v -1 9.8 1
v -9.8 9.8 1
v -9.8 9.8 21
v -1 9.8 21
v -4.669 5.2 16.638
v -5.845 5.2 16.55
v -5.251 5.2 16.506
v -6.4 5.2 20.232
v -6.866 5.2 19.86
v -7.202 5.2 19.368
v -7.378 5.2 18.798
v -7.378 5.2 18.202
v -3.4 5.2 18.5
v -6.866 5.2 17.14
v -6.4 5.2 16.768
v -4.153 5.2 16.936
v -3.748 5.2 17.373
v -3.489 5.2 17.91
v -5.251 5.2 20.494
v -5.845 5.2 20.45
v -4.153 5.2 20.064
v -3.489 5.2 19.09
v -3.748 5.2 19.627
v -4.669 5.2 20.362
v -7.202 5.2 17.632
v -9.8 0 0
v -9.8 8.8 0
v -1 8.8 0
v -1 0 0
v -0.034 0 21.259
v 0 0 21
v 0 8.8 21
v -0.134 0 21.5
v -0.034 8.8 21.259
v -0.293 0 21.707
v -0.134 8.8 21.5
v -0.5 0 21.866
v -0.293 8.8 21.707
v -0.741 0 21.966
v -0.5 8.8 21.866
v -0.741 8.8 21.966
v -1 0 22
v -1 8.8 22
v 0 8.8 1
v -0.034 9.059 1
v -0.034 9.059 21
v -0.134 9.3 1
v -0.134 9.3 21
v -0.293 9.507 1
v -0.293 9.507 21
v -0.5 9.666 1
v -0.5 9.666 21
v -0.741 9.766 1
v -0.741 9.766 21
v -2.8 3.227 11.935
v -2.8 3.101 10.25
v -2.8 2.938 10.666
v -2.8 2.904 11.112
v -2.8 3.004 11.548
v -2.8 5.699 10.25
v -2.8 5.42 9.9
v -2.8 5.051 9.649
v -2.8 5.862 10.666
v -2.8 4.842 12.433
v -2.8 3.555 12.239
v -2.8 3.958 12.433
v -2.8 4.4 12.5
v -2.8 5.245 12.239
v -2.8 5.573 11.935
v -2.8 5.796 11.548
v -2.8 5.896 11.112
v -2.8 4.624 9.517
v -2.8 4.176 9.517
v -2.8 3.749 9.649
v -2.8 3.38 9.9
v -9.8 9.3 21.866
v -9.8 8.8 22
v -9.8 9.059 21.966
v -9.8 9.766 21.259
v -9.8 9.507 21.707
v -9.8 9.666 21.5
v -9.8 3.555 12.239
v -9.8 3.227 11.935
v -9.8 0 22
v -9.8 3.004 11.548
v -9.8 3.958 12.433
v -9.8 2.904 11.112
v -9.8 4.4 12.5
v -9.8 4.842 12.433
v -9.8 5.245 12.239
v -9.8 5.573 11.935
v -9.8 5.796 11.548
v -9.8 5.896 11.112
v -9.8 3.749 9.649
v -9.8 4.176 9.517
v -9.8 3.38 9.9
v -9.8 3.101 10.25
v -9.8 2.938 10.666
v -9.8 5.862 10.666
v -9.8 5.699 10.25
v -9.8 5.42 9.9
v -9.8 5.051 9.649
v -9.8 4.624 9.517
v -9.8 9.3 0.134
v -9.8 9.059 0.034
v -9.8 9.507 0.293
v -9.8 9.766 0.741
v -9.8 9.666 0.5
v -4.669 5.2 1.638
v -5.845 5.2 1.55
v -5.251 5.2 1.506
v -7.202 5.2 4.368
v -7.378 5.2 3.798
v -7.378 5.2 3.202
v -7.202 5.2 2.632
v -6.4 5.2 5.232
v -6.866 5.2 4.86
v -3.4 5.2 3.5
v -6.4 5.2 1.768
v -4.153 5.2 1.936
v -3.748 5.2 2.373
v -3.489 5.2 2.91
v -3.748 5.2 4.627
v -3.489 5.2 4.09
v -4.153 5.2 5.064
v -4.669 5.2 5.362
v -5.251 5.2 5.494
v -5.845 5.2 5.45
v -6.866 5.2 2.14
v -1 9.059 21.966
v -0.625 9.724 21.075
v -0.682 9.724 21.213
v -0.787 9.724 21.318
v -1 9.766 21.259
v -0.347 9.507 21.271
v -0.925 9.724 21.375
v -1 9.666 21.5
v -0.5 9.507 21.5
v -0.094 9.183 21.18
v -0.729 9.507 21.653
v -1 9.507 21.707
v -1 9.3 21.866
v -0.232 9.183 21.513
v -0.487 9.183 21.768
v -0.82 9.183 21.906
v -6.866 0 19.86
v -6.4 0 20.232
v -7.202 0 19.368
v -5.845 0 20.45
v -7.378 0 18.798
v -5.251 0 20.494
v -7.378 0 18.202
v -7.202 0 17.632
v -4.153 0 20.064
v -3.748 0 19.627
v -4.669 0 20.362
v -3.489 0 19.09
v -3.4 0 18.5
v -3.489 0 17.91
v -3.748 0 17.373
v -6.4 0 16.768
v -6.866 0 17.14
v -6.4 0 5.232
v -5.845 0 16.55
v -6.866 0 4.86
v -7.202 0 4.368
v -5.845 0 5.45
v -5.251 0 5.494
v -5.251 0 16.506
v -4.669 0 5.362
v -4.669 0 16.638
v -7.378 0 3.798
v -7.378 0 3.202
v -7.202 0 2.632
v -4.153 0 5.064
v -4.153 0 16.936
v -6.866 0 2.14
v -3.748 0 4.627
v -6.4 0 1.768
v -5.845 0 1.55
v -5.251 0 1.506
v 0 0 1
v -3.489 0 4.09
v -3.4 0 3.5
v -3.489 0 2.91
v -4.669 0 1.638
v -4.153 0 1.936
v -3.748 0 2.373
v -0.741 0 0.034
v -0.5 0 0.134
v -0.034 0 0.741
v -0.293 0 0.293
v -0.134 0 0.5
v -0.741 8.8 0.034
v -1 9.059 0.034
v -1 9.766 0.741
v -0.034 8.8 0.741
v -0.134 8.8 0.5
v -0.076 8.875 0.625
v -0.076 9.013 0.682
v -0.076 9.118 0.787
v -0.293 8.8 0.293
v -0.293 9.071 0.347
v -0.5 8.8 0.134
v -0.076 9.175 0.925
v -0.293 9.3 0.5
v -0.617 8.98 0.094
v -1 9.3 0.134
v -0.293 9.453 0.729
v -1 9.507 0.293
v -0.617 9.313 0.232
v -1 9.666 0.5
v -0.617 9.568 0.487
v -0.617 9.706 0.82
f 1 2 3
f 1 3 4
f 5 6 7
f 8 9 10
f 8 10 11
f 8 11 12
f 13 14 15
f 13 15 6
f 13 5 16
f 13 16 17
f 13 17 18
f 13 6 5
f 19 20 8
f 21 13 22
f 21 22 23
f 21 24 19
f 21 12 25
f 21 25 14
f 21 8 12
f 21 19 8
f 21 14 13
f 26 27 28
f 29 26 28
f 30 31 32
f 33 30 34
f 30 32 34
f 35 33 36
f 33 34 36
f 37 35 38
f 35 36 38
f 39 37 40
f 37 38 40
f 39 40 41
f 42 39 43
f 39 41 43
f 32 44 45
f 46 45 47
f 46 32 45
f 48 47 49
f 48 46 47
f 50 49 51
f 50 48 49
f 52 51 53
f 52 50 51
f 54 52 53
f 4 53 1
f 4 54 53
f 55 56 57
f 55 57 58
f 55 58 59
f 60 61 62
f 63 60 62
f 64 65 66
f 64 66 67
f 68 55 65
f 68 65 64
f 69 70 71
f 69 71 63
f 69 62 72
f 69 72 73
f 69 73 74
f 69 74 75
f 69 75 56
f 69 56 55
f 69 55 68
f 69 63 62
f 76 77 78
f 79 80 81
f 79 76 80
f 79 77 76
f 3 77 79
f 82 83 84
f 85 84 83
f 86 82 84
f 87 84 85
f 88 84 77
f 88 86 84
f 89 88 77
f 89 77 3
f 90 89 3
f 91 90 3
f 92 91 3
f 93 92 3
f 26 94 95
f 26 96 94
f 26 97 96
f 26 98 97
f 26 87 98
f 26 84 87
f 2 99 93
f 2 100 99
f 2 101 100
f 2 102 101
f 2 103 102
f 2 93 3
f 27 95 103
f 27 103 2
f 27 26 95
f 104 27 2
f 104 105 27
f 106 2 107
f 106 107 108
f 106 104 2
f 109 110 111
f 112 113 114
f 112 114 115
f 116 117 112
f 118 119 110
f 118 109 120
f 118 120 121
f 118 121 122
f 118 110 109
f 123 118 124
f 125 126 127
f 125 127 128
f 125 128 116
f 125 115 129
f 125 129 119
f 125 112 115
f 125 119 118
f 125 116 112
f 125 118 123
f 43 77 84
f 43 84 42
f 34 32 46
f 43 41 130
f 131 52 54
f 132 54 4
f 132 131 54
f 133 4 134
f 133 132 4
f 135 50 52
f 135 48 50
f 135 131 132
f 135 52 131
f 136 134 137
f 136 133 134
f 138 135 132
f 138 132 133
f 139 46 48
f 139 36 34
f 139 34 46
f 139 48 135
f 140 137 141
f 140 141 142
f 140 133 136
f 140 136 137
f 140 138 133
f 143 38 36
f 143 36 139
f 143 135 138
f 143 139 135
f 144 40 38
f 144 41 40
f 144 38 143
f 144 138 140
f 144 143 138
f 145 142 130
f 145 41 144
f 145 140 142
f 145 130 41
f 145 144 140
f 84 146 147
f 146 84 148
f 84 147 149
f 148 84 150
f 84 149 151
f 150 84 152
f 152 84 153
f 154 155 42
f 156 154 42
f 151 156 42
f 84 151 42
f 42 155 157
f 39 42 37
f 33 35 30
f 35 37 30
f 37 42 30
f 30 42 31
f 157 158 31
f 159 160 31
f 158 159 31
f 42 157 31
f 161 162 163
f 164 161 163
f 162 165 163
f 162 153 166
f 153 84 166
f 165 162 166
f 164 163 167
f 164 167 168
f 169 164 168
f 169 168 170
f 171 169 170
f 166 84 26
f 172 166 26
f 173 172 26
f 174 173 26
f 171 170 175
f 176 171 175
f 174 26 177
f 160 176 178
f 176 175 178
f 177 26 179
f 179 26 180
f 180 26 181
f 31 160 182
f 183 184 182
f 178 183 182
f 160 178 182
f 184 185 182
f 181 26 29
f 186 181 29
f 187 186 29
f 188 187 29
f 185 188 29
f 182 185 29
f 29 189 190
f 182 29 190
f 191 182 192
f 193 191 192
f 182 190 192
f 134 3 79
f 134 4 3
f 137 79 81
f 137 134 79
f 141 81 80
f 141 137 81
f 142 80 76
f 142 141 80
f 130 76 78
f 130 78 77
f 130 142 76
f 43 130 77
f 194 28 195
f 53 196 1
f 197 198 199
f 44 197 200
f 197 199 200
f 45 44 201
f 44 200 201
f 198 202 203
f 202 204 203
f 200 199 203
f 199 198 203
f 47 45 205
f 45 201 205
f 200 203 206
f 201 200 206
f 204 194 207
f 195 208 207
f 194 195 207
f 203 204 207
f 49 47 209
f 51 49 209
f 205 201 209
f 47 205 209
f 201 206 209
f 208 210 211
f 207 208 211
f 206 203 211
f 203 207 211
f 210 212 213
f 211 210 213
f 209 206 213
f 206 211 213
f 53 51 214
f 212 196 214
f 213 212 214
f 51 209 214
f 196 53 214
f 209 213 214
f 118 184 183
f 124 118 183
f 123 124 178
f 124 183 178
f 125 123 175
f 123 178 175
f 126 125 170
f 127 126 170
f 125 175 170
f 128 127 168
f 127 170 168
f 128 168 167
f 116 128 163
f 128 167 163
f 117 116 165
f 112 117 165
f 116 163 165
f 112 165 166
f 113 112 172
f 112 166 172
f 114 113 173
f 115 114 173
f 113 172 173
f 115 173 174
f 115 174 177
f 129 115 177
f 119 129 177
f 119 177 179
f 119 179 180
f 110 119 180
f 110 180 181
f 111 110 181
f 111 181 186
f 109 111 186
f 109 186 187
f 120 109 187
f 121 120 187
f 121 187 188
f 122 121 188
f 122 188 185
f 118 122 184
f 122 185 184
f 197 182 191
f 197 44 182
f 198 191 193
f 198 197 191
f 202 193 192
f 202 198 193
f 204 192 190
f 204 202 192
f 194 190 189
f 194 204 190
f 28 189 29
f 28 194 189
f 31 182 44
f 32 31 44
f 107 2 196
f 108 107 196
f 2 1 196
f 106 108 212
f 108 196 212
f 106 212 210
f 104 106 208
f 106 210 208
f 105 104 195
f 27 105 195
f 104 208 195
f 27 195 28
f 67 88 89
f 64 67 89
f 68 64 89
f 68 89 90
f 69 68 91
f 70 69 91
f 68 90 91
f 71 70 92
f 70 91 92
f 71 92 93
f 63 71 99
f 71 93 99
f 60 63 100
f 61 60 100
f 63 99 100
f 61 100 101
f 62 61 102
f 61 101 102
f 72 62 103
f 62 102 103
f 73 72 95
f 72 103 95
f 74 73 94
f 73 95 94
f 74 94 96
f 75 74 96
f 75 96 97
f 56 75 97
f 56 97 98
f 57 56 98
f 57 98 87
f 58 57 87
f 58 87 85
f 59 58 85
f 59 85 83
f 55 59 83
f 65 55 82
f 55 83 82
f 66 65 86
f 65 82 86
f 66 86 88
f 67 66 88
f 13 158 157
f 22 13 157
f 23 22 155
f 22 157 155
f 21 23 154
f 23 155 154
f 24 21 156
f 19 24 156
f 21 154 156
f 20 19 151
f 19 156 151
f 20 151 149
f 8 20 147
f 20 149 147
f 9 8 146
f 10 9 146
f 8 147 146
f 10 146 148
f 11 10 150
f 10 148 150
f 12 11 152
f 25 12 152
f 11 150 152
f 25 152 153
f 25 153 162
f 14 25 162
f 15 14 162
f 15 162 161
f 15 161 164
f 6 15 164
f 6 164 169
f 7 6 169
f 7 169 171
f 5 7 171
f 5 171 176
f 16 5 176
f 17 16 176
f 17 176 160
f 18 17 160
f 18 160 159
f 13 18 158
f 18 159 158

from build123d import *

# Parameters (mm, degrees)
CROQUIS1_W              = 9.8
CROQUIS1_H              = 9.8
SALIENTE_EXTRUIR1_DEPTH = 22
REDONDEO1_R             = 1
CROQUIS2_R              = 1.5
CORTAR_EXTRUIR1_DEPTH   = 7
CROQUIS3_R              = 2
CORTAR_EXTRUIR2_DEPTH   = 5.2


with BuildPart() as part:
    # Croquis1 → Saliente-Extruir1 (new body)
    with BuildSketch(Plane.XY):
        with Locations((-4.9, 4.9)):
            Rectangle(CROQUIS1_W, CROQUIS1_H)
    extrude(amount=SALIENTE_EXTRUIR1_DEPTH)

    # Redondeo1
    redondeo1_edges = [part.edges().sort_by_distance(p)[0] for p in [
        (0, 4.9, 22),
        (-4.9, 9.8, 0),
        (0, 4.9, 0),
        (0, 9.8, 11),
        (-4.9, 9.8, 22),
    ]]
    fillet(redondeo1_edges, radius=REDONDEO1_R)

    # Croquis2 → Cortar-Extruir1 (cut)
    with BuildSketch(Plane.ZY.offset(9.8)):
        with Locations((11, 4.4)):
            Circle(CROQUIS2_R)
    extrude(amount=-CORTAR_EXTRUIR1_DEPTH, mode=Mode.SUBTRACT)

    # Croquis3 → Cortar-Extruir2 (cut)
    with BuildSketch(Plane.XZ):
        with Locations((-5.4, 18.5)):
            Circle(CROQUIS3_R)
        with Locations((-5.4, 3.5)):
            Circle(CROQUIS3_R)
    extrude(amount=-CORTAR_EXTRUIR2_DEPTH, mode=Mode.SUBTRACT)


solid = part.part
